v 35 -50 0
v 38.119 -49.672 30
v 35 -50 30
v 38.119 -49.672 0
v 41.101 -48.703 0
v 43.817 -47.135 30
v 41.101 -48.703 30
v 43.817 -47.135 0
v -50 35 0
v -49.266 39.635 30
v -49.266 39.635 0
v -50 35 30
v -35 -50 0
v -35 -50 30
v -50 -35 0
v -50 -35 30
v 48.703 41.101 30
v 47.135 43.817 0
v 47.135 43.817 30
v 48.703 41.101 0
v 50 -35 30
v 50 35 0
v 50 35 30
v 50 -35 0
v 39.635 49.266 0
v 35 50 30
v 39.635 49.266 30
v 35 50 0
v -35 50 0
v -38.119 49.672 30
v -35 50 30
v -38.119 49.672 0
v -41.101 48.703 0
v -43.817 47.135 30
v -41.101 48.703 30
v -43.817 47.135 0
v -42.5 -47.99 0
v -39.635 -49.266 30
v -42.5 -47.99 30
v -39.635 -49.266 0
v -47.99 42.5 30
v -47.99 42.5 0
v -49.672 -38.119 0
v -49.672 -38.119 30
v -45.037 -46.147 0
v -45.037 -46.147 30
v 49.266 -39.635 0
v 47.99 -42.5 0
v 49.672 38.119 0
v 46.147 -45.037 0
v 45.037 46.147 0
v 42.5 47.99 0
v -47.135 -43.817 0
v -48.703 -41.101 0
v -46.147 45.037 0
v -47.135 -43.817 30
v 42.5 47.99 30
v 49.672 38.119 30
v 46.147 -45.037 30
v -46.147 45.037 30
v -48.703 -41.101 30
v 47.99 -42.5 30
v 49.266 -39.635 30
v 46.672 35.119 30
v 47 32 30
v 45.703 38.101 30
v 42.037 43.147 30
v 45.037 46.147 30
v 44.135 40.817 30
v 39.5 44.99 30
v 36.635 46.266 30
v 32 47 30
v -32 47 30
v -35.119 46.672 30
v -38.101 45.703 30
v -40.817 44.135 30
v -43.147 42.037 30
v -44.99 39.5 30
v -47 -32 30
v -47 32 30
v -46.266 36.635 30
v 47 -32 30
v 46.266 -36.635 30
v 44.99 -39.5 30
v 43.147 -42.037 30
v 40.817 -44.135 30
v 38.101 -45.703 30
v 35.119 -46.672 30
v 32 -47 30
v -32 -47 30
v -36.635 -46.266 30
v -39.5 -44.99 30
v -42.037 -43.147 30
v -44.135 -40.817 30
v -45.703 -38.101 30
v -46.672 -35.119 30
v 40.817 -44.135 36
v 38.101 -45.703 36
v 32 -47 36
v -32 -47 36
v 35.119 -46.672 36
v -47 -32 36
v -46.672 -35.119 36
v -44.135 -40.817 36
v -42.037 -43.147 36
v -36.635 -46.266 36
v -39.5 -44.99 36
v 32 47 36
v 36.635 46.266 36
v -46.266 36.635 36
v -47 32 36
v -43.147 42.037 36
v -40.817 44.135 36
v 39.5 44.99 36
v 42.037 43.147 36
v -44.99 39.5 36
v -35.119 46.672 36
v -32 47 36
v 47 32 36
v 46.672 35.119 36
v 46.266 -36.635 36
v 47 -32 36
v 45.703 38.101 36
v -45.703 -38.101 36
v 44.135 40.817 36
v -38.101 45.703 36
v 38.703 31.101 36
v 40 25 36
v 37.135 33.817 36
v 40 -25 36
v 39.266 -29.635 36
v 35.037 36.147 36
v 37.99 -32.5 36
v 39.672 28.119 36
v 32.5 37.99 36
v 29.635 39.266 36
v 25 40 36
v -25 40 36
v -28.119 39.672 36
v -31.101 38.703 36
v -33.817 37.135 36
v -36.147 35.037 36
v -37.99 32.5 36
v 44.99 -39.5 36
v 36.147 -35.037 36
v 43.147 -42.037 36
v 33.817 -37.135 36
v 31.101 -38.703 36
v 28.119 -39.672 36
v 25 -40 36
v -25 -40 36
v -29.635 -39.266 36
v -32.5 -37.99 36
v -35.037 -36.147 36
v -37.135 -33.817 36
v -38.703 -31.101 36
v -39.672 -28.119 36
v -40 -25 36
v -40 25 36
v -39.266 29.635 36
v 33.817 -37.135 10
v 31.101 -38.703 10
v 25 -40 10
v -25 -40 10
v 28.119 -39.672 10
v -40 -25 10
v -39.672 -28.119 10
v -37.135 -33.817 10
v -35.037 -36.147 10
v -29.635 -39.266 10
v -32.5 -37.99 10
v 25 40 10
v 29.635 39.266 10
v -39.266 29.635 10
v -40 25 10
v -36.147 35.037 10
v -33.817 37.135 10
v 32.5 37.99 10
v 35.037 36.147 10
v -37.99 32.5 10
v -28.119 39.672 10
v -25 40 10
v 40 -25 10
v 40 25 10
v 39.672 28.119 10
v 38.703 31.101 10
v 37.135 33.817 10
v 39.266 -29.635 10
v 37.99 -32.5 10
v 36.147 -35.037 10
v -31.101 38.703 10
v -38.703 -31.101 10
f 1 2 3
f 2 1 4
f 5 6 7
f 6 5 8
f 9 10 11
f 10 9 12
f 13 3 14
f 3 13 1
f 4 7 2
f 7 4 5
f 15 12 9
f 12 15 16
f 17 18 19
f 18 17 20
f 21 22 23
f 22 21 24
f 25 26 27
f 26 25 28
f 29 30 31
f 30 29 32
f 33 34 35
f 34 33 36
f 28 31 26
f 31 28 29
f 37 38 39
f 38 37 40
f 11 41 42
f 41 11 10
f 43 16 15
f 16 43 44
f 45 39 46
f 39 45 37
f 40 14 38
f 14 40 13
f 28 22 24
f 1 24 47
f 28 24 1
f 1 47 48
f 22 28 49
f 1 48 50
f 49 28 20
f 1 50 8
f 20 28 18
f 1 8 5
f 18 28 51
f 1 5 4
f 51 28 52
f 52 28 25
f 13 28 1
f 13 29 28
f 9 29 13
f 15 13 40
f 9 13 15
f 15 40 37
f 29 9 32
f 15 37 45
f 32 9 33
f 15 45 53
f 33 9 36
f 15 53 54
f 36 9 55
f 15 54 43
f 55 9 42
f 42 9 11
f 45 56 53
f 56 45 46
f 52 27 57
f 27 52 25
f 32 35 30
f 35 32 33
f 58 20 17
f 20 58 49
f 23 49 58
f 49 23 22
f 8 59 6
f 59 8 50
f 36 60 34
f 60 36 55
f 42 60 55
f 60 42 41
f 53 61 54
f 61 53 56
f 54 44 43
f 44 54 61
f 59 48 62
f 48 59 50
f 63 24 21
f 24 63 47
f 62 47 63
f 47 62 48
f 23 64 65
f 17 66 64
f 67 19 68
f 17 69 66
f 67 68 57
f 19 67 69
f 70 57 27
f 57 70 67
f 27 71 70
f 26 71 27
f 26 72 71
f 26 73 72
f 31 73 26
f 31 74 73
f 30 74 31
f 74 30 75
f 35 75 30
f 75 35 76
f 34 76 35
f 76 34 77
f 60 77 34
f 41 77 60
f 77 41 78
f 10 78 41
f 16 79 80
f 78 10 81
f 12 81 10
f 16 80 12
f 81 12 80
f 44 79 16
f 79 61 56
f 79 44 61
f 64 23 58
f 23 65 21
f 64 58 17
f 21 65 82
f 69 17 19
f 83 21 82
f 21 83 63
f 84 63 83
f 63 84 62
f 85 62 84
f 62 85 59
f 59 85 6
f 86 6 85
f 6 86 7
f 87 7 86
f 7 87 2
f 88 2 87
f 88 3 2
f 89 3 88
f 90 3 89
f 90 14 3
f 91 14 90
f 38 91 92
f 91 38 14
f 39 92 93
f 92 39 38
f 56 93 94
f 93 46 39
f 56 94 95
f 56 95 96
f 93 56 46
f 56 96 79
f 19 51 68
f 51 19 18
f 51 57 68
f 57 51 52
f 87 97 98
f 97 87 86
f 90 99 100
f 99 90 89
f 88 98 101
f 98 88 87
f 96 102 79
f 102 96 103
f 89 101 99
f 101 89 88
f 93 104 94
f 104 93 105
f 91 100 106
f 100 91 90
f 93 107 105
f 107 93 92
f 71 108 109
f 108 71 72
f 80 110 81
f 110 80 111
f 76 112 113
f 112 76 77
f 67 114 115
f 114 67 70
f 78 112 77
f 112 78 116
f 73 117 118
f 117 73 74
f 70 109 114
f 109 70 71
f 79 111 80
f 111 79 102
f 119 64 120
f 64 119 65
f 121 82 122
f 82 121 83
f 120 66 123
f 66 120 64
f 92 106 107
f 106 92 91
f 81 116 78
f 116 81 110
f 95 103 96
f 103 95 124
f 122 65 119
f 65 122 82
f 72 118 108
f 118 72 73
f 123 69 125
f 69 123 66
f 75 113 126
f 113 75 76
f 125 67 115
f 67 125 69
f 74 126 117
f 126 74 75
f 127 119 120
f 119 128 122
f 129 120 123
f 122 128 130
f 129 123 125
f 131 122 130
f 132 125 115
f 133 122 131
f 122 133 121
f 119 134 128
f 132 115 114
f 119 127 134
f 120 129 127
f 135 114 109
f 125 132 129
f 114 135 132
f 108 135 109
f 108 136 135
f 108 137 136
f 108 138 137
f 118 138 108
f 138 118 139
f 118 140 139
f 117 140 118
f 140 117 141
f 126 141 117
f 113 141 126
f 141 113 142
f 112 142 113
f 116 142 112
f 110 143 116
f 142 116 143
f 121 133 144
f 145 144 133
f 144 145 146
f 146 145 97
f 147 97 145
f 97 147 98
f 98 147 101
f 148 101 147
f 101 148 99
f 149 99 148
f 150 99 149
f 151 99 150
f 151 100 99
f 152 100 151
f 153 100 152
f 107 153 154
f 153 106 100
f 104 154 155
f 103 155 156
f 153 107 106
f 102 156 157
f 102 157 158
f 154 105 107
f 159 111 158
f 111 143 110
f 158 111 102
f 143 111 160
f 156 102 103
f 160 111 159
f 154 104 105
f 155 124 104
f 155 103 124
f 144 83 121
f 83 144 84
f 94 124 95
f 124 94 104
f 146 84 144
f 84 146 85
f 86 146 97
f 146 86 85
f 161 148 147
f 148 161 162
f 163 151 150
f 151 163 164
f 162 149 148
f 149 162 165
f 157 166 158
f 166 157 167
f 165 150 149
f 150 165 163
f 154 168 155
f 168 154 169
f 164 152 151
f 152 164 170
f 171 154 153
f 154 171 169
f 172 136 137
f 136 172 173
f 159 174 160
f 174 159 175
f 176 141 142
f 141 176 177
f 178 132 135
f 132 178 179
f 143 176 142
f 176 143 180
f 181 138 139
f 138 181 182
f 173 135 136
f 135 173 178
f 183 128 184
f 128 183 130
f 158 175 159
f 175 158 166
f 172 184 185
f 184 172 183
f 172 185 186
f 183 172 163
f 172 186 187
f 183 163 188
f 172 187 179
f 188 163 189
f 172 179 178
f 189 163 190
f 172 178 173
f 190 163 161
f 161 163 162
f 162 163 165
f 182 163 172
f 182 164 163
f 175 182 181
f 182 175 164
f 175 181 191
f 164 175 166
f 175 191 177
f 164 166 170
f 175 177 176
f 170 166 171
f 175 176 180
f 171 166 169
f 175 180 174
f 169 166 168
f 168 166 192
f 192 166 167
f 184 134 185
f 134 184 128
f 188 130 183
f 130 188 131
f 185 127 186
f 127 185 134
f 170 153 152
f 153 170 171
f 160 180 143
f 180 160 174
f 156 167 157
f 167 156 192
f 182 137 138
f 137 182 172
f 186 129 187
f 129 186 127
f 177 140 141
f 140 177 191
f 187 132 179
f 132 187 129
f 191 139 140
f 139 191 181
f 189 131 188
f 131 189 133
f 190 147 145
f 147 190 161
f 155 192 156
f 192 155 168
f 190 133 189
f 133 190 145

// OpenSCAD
grosor        = 10;
size          = 100;
altura        = 30;
altura_solapa = altura + altura*0.2;
redondeo      = 15;


difference() {
  union() {
    linear_extrude(altura)
      offset(redondeo)
      square(size-redondeo*2, center=true);
    linear_extrude(altura_solapa)
      offset(redondeo)
      square(size-(altura_solapa-altura)-redondeo*2,
             center=true);
  }
  translate([0,0,grosor])
    linear_extrude(altura_solapa + altura*0.1)
    offset(redondeo)
    square(size-grosor-grosor-redondeo*2,
           center=true);
}
